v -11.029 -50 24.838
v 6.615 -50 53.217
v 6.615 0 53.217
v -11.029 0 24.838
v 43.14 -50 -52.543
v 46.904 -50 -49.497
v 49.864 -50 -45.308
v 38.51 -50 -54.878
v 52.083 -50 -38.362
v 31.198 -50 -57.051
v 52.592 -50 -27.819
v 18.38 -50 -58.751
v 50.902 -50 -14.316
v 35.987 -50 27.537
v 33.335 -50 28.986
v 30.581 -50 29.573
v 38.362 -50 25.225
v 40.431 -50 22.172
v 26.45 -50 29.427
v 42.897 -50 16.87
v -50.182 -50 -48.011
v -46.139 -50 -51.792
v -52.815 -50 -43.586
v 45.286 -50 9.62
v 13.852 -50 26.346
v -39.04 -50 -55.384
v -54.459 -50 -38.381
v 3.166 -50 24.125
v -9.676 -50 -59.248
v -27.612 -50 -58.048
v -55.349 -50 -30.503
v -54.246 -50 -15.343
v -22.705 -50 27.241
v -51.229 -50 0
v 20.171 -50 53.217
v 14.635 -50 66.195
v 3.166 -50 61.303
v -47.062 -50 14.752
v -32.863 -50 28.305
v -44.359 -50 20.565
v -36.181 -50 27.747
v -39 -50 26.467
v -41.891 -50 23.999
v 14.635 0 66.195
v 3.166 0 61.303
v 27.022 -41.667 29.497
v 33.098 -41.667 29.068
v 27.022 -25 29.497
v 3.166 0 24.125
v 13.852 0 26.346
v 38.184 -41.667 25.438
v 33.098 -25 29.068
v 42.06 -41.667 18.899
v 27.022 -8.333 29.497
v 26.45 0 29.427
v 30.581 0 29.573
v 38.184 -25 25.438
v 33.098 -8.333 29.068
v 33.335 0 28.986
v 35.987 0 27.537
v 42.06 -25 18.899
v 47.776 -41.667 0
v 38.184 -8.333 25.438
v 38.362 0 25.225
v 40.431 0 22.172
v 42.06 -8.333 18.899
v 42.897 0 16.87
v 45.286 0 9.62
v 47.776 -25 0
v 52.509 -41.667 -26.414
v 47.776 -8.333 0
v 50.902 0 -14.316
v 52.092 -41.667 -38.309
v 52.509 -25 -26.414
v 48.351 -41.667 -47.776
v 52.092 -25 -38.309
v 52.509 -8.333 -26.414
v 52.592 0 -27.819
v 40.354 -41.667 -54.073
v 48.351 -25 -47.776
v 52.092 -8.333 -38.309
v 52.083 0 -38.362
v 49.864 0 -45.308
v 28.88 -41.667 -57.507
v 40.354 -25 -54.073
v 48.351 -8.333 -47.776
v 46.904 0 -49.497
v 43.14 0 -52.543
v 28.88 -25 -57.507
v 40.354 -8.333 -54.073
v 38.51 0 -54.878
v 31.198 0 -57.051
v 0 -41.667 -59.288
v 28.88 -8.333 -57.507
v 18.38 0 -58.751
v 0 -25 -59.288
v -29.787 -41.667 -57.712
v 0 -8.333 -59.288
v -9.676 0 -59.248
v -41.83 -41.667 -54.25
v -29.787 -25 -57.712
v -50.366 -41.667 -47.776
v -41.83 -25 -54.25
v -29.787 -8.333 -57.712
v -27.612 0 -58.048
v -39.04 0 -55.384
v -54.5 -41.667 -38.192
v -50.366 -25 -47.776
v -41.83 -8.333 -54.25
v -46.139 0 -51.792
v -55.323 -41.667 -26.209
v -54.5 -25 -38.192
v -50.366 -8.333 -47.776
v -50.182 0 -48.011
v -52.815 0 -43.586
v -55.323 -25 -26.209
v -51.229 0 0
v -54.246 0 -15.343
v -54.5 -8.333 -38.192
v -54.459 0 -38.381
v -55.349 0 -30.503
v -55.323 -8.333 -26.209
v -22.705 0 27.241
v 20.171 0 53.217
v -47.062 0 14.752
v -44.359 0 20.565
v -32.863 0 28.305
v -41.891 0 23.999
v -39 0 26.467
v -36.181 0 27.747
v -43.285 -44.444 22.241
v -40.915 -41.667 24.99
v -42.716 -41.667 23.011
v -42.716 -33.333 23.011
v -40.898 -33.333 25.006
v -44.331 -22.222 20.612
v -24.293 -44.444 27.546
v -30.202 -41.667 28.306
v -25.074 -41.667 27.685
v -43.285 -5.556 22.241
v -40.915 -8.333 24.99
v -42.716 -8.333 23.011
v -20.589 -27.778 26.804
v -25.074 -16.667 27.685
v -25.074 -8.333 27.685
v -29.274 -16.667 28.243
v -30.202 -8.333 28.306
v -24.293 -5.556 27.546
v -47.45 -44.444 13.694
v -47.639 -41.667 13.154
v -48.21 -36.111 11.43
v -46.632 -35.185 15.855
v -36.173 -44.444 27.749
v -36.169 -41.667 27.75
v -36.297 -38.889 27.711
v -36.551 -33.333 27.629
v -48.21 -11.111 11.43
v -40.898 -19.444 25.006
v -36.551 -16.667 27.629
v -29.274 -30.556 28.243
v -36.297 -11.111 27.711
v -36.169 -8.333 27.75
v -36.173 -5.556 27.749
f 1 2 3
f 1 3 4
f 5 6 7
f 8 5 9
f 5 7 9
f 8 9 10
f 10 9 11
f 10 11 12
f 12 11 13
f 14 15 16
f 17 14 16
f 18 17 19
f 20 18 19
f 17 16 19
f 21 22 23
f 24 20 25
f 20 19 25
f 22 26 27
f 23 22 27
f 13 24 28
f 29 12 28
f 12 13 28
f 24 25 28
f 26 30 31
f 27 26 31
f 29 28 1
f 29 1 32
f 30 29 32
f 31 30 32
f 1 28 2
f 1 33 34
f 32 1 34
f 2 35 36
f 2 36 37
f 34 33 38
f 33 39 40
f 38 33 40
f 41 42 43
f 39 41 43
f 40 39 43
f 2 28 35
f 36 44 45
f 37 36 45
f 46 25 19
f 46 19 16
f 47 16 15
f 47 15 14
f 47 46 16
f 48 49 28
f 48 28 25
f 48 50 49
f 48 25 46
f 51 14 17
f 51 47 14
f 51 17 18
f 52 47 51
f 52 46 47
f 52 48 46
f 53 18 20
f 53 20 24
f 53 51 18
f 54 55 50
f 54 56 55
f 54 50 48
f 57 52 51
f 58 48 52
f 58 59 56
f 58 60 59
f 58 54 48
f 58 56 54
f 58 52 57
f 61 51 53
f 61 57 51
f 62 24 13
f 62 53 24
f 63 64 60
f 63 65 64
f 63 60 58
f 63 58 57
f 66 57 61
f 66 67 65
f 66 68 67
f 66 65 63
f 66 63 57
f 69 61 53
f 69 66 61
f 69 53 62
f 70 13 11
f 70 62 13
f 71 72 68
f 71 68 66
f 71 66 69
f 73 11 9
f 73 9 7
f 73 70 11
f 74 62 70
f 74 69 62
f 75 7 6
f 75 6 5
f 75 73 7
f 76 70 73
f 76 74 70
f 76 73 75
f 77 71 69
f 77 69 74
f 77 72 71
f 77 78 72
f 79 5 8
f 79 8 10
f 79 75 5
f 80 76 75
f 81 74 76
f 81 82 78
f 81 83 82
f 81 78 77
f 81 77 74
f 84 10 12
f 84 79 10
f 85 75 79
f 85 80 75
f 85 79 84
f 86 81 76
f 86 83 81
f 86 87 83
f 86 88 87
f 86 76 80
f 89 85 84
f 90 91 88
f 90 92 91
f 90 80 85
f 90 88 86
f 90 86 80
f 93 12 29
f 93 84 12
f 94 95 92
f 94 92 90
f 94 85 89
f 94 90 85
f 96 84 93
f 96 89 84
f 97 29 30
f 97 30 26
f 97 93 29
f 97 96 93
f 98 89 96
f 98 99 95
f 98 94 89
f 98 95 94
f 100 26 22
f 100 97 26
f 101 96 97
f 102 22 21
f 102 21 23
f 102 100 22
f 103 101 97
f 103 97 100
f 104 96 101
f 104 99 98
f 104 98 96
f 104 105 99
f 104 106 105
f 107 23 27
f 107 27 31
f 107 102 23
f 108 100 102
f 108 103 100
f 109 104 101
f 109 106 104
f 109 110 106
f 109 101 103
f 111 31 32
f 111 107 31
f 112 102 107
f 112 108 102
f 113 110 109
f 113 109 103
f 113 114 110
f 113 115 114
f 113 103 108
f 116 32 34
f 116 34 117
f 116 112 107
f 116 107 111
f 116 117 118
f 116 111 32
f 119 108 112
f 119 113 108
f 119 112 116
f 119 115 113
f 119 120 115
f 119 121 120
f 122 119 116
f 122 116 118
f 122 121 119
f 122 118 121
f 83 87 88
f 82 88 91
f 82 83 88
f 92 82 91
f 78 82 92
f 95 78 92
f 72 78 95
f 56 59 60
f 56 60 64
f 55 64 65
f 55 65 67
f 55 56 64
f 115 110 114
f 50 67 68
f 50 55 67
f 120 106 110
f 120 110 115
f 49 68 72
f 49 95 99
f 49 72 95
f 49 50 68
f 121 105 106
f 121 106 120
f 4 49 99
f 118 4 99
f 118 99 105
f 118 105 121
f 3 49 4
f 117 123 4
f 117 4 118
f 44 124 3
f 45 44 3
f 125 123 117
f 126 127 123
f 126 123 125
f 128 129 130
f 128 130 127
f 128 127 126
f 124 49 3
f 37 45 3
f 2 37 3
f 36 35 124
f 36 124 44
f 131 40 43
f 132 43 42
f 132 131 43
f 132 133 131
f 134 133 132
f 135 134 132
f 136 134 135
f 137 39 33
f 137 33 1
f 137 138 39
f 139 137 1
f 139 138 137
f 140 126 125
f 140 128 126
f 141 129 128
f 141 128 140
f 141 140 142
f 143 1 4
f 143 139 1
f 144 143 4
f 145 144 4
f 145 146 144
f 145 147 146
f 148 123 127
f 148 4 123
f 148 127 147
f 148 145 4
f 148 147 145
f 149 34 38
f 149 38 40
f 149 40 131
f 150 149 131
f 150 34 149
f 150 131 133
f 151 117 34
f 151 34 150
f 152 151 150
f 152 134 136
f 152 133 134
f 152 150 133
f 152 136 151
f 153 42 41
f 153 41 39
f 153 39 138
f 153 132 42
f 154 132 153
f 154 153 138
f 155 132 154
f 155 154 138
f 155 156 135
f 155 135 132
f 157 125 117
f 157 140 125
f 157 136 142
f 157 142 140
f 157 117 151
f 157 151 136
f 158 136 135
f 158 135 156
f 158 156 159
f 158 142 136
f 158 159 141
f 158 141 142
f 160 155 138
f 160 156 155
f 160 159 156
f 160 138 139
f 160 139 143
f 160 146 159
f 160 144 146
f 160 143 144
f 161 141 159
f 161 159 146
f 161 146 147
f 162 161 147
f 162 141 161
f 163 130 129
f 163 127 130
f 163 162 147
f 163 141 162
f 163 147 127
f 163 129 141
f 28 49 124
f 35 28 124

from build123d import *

# Parameters (mm, degrees)
F1_DEPTH = 50


with BuildPart() as f1:
    # F0 (on Front) → F1 (new body)
    with BuildSketch(Plane.XZ):
        with BuildLine():
            add(Edge.make_bspline(
                [(-51.2294247746, 0), (-48.0854485282, 13.6071053032), (-41.927826313, 33.8464912874), (-20.8497275357, 26.5603434156), (-11.0291788949, 24.8378052114)],
                knots=[0, 0, 0, 0, 0.1092204456, 0.1955358624, 0.1955358624, 0.1955358624, 0.1955358624], degree=3))
            add(Edge.make_bspline(
                [(3.1658646185, 24.1252042403), (14.9152500947, 25.4625918381), (37.628007928, 37.9190156376), (48.549181092, -0.6511716252), (60.2302108757, -57.760654384), (-0.1215901237, -59.9313006371), (-62.1199501481, -58.2900027863), (-55.1148803249, -16.8162220956), (-51.2294247746, 0)],
                knots=[0.23685046, 0.23685046, 0.23685046, 0.23685046, 0.3406016633, 0.4520302399, 0.5870032511, 0.7246666849, 0.8650208674, 1, 1, 1, 1], degree=3))
            add(Edge.make_bspline(
                [(-11.0291788949, 24.8378052114), (-7.3831237705, 24.198281955), (-2.5908458949, 23.6392497789), (2.1162519942, 24.0057308509), (3.1658646185, 24.1252042403)],
                knots=[0.1955358624, 0.1955358624, 0.1955358624, 0.1955358624, 0.2275820116, 0.23685046, 0.23685046, 0.23685046, 0.23685046], degree=3))
        make_face()
        with BuildLine():
            Line((6.6148478992, 53.2173570817), (-11.0291788949, 24.8378052114))
            add(Edge.make_bspline(
                [(-11.0291788949, 24.8378052114), (-7.3831237705, 24.198281955), (-2.5908458949, 23.6392497789), (2.1162519942, 24.0057308509), (3.1658646185, 24.1252042403)],
                knots=[0.1955358624, 0.1955358624, 0.1955358624, 0.1955358624, 0.2275820116, 0.23685046, 0.23685046, 0.23685046, 0.23685046], degree=3))
            Line((3.1658646185, 24.1252042403), (20.1712839563, 53.2173570817))
            Line((20.1712839563, 53.2173570817), (14.6352494443, 66.1951935157))
            Line((14.6352494443, 66.1951935157), (3.1658646185, 61.3026283682))
            Line((3.1658646185, 61.3026283682), (6.6148478992, 53.2173570817))
        make_face()
    extrude(amount=F1_DEPTH)


solid = f1.part
